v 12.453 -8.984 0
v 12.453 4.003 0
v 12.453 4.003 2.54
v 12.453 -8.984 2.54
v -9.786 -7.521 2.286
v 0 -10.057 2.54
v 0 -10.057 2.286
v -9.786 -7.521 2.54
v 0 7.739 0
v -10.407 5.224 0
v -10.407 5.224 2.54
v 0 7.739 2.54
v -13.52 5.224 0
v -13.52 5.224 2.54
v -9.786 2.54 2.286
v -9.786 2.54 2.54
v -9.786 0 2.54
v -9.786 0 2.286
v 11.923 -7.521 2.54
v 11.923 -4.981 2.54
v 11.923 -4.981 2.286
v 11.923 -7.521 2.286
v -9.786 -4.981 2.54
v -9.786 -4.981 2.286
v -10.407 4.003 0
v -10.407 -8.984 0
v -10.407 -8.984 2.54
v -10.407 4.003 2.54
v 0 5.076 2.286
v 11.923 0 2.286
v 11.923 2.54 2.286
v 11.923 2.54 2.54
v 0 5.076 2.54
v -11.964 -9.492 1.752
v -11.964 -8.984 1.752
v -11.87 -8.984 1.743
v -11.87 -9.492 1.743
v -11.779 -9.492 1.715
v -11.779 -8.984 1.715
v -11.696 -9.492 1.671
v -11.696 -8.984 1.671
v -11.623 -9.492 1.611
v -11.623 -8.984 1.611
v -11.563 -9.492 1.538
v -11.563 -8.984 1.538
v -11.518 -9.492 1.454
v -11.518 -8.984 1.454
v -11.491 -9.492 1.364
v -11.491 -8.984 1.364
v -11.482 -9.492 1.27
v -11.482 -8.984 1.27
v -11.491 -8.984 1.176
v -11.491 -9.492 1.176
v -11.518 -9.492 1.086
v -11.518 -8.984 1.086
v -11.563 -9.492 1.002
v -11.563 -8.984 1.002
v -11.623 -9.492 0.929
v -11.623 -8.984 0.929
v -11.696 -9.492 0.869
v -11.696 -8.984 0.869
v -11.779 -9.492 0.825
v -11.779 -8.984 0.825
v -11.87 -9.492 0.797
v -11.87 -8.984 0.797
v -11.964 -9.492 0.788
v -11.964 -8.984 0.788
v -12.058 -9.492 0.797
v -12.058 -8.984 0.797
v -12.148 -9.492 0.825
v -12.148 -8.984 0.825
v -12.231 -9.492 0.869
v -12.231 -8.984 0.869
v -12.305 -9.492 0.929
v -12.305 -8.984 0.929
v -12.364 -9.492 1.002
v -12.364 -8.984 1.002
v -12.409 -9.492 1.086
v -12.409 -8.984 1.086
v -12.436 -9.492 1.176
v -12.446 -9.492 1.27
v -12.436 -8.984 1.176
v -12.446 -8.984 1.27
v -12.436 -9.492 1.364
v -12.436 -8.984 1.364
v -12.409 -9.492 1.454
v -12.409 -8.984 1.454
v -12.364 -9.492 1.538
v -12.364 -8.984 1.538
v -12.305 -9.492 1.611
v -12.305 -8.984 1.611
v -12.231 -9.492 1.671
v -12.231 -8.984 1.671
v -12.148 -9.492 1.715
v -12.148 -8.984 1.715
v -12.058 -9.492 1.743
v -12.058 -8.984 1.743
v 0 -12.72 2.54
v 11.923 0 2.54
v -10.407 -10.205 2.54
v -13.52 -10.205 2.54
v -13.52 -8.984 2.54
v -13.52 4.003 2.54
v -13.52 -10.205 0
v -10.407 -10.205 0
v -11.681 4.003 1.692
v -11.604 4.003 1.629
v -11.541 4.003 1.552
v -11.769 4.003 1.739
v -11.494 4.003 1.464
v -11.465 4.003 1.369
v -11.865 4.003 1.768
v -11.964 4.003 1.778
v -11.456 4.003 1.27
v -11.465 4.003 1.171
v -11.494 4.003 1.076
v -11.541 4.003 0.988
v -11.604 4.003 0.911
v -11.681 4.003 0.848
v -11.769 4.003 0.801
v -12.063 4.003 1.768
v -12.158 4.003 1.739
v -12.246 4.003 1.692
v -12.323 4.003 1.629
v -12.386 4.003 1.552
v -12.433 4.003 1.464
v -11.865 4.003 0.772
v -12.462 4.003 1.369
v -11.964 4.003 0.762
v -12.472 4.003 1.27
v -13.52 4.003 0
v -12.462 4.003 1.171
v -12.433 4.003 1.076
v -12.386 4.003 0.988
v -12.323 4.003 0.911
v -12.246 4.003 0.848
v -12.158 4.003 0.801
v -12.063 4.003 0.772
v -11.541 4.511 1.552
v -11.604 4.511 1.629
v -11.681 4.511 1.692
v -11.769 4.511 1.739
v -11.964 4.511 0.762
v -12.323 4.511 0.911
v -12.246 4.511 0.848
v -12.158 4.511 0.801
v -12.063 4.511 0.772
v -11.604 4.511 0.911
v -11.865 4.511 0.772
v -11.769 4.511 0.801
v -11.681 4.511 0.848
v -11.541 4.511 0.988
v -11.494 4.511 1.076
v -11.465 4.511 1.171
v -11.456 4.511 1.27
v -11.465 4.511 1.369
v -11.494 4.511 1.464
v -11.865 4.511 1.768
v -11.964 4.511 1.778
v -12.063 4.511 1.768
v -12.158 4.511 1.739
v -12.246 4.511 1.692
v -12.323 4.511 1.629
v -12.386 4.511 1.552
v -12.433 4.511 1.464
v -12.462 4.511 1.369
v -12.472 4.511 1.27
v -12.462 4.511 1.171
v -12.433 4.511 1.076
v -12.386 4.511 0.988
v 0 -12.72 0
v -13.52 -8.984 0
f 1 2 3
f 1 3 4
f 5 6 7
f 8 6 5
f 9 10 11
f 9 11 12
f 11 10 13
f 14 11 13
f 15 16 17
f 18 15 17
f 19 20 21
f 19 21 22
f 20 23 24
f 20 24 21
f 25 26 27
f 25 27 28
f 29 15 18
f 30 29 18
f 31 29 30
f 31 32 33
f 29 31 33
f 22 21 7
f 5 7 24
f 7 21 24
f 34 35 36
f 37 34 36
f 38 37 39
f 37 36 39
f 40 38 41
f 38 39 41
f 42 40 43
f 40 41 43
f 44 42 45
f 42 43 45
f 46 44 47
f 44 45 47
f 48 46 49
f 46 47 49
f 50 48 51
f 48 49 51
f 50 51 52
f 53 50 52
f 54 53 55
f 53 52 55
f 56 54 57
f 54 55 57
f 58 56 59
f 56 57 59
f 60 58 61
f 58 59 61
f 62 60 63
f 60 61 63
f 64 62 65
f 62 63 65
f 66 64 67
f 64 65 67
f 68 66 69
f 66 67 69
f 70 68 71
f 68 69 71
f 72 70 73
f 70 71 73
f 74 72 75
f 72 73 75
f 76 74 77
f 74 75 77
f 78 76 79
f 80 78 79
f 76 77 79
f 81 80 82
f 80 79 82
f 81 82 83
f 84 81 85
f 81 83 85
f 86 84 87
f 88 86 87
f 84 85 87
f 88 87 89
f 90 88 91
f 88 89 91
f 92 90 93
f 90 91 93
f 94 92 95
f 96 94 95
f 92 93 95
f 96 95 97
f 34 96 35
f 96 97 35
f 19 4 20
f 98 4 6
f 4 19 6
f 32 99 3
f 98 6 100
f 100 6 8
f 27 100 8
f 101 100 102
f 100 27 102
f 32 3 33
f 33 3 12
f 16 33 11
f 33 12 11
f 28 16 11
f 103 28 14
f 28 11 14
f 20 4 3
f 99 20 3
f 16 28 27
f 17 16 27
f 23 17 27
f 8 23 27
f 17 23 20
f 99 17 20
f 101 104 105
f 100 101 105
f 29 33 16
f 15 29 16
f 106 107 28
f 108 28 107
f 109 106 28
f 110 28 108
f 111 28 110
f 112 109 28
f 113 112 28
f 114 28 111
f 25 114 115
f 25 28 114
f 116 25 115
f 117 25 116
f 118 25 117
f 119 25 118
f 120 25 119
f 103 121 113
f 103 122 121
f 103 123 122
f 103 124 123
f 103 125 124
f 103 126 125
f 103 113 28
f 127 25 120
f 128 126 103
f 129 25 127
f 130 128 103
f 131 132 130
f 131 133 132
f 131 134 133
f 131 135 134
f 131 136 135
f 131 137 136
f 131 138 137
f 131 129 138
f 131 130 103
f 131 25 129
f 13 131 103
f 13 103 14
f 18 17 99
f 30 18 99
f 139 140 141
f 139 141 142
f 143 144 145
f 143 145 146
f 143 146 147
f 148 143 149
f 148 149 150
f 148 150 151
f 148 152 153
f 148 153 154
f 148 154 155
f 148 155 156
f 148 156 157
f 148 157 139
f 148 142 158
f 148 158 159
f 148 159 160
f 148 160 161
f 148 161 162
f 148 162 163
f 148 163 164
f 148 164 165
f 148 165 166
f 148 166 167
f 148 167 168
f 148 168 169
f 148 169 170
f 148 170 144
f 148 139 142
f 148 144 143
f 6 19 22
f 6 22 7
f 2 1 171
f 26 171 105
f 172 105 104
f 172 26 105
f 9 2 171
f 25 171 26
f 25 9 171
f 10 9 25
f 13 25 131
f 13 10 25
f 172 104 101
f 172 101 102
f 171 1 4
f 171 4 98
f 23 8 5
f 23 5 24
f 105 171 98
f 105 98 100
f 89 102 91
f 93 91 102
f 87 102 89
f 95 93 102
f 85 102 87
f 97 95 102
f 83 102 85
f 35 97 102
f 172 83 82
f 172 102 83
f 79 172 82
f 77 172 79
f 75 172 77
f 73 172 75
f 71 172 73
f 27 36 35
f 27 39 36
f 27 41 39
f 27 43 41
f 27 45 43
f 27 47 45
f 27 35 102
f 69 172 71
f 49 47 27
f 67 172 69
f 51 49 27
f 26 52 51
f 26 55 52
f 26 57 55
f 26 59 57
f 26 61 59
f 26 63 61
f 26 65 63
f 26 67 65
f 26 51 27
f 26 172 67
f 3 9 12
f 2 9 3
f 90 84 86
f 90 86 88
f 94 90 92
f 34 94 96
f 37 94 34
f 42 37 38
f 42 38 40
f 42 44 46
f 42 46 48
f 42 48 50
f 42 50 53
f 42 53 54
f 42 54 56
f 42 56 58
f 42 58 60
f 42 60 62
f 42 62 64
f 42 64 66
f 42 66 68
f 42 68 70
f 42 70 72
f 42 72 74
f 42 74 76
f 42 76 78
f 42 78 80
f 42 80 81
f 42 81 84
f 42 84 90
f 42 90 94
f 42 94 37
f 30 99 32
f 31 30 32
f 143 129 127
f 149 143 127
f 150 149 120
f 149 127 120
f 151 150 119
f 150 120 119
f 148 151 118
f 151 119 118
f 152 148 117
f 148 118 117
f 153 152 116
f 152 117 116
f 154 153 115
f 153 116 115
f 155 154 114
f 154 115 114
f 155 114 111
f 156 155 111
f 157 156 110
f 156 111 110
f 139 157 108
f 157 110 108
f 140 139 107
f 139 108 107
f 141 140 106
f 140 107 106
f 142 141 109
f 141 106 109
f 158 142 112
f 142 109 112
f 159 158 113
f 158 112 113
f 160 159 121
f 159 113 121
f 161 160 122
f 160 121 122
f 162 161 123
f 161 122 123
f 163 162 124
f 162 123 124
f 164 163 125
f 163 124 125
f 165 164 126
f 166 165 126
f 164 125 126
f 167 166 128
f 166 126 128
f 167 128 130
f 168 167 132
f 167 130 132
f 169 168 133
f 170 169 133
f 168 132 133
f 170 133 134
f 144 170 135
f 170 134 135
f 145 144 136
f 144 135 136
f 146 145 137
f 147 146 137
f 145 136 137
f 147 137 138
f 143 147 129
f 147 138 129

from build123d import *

# Parameters (mm, degrees)
BOSS_EXTRUDE1_DEPTH = 2.54
CUT_EXTRUDE2_DEPTH  = 0.254
SKETCH5_R           = 0.482014483
CUT_EXTRUDE3_DEPTH  = 0.508
SKETCH6_R           = 0.508
CUT_EXTRUDE4_DEPTH  = 0.508


with BuildPart() as part:
    # Sketch1 → Boss-Extrude1 (new body)
    with BuildSketch(Plane.XY):
        Polygon((-10.407081712, 5.223554475), (0, 7.738599222), (12.452918288, 4.002723735), (12.452918288, -8.983891051), (0, -12.719766537), (-10.407081712, -10.20472179), (-12.275019455, -10.20472179), (-13.520311284, -10.20472179), (-13.520311284, -8.983891051), (-10.407081712, -8.983891051), (-10.407081712, 4.002723735), (-13.520311284, 4.002723735), (-13.520311284, 5.223554475), (-12.275019455, 5.223554475), align=None)
    extrude(amount=BOSS_EXTRUDE1_DEPTH)

    # Sketch4 → Cut-Extrude2 (cut)
    with BuildSketch(Plane.XY.offset(2.54)):
        Polygon((-9.78623868, 0), (11.923219726, 0), (11.923219726, 2.54), (0, 5.075533386), (-9.78623868, 2.54), align=None)
        Polygon((0, -10.056700701), (-9.78623868, -7.521167315), (-9.78623868, -4.981167315), (11.923219726, -4.981167315), (11.923219726, -7.521167315), align=None)
    extrude(amount=-CUT_EXTRUDE2_DEPTH, mode=Mode.SUBTRACT)

    # Sketch5 → Cut-Extrude3 (cut)
    with BuildSketch(Plane(origin=(0, -8.983891051, 0), x_dir=(1, 0, 0), z_dir=(0, 1, 0))):
        with Locations(Location((-11.963696498, -1.27, 0), (0, 0, 270))):
            Circle(SKETCH5_R)
    extrude(amount=-CUT_EXTRUDE3_DEPTH, mode=Mode.SUBTRACT)

    # Sketch6 → Cut-Extrude4 (cut)
    with BuildSketch(Plane.XZ.offset(-4.002723735)):
        with Locations(Location((-11.963696498, 1.27, 0), (0, 0, 270))):
            Circle(SKETCH6_R)
    extrude(amount=-CUT_EXTRUDE4_DEPTH, mode=Mode.SUBTRACT)


solid = part.part
